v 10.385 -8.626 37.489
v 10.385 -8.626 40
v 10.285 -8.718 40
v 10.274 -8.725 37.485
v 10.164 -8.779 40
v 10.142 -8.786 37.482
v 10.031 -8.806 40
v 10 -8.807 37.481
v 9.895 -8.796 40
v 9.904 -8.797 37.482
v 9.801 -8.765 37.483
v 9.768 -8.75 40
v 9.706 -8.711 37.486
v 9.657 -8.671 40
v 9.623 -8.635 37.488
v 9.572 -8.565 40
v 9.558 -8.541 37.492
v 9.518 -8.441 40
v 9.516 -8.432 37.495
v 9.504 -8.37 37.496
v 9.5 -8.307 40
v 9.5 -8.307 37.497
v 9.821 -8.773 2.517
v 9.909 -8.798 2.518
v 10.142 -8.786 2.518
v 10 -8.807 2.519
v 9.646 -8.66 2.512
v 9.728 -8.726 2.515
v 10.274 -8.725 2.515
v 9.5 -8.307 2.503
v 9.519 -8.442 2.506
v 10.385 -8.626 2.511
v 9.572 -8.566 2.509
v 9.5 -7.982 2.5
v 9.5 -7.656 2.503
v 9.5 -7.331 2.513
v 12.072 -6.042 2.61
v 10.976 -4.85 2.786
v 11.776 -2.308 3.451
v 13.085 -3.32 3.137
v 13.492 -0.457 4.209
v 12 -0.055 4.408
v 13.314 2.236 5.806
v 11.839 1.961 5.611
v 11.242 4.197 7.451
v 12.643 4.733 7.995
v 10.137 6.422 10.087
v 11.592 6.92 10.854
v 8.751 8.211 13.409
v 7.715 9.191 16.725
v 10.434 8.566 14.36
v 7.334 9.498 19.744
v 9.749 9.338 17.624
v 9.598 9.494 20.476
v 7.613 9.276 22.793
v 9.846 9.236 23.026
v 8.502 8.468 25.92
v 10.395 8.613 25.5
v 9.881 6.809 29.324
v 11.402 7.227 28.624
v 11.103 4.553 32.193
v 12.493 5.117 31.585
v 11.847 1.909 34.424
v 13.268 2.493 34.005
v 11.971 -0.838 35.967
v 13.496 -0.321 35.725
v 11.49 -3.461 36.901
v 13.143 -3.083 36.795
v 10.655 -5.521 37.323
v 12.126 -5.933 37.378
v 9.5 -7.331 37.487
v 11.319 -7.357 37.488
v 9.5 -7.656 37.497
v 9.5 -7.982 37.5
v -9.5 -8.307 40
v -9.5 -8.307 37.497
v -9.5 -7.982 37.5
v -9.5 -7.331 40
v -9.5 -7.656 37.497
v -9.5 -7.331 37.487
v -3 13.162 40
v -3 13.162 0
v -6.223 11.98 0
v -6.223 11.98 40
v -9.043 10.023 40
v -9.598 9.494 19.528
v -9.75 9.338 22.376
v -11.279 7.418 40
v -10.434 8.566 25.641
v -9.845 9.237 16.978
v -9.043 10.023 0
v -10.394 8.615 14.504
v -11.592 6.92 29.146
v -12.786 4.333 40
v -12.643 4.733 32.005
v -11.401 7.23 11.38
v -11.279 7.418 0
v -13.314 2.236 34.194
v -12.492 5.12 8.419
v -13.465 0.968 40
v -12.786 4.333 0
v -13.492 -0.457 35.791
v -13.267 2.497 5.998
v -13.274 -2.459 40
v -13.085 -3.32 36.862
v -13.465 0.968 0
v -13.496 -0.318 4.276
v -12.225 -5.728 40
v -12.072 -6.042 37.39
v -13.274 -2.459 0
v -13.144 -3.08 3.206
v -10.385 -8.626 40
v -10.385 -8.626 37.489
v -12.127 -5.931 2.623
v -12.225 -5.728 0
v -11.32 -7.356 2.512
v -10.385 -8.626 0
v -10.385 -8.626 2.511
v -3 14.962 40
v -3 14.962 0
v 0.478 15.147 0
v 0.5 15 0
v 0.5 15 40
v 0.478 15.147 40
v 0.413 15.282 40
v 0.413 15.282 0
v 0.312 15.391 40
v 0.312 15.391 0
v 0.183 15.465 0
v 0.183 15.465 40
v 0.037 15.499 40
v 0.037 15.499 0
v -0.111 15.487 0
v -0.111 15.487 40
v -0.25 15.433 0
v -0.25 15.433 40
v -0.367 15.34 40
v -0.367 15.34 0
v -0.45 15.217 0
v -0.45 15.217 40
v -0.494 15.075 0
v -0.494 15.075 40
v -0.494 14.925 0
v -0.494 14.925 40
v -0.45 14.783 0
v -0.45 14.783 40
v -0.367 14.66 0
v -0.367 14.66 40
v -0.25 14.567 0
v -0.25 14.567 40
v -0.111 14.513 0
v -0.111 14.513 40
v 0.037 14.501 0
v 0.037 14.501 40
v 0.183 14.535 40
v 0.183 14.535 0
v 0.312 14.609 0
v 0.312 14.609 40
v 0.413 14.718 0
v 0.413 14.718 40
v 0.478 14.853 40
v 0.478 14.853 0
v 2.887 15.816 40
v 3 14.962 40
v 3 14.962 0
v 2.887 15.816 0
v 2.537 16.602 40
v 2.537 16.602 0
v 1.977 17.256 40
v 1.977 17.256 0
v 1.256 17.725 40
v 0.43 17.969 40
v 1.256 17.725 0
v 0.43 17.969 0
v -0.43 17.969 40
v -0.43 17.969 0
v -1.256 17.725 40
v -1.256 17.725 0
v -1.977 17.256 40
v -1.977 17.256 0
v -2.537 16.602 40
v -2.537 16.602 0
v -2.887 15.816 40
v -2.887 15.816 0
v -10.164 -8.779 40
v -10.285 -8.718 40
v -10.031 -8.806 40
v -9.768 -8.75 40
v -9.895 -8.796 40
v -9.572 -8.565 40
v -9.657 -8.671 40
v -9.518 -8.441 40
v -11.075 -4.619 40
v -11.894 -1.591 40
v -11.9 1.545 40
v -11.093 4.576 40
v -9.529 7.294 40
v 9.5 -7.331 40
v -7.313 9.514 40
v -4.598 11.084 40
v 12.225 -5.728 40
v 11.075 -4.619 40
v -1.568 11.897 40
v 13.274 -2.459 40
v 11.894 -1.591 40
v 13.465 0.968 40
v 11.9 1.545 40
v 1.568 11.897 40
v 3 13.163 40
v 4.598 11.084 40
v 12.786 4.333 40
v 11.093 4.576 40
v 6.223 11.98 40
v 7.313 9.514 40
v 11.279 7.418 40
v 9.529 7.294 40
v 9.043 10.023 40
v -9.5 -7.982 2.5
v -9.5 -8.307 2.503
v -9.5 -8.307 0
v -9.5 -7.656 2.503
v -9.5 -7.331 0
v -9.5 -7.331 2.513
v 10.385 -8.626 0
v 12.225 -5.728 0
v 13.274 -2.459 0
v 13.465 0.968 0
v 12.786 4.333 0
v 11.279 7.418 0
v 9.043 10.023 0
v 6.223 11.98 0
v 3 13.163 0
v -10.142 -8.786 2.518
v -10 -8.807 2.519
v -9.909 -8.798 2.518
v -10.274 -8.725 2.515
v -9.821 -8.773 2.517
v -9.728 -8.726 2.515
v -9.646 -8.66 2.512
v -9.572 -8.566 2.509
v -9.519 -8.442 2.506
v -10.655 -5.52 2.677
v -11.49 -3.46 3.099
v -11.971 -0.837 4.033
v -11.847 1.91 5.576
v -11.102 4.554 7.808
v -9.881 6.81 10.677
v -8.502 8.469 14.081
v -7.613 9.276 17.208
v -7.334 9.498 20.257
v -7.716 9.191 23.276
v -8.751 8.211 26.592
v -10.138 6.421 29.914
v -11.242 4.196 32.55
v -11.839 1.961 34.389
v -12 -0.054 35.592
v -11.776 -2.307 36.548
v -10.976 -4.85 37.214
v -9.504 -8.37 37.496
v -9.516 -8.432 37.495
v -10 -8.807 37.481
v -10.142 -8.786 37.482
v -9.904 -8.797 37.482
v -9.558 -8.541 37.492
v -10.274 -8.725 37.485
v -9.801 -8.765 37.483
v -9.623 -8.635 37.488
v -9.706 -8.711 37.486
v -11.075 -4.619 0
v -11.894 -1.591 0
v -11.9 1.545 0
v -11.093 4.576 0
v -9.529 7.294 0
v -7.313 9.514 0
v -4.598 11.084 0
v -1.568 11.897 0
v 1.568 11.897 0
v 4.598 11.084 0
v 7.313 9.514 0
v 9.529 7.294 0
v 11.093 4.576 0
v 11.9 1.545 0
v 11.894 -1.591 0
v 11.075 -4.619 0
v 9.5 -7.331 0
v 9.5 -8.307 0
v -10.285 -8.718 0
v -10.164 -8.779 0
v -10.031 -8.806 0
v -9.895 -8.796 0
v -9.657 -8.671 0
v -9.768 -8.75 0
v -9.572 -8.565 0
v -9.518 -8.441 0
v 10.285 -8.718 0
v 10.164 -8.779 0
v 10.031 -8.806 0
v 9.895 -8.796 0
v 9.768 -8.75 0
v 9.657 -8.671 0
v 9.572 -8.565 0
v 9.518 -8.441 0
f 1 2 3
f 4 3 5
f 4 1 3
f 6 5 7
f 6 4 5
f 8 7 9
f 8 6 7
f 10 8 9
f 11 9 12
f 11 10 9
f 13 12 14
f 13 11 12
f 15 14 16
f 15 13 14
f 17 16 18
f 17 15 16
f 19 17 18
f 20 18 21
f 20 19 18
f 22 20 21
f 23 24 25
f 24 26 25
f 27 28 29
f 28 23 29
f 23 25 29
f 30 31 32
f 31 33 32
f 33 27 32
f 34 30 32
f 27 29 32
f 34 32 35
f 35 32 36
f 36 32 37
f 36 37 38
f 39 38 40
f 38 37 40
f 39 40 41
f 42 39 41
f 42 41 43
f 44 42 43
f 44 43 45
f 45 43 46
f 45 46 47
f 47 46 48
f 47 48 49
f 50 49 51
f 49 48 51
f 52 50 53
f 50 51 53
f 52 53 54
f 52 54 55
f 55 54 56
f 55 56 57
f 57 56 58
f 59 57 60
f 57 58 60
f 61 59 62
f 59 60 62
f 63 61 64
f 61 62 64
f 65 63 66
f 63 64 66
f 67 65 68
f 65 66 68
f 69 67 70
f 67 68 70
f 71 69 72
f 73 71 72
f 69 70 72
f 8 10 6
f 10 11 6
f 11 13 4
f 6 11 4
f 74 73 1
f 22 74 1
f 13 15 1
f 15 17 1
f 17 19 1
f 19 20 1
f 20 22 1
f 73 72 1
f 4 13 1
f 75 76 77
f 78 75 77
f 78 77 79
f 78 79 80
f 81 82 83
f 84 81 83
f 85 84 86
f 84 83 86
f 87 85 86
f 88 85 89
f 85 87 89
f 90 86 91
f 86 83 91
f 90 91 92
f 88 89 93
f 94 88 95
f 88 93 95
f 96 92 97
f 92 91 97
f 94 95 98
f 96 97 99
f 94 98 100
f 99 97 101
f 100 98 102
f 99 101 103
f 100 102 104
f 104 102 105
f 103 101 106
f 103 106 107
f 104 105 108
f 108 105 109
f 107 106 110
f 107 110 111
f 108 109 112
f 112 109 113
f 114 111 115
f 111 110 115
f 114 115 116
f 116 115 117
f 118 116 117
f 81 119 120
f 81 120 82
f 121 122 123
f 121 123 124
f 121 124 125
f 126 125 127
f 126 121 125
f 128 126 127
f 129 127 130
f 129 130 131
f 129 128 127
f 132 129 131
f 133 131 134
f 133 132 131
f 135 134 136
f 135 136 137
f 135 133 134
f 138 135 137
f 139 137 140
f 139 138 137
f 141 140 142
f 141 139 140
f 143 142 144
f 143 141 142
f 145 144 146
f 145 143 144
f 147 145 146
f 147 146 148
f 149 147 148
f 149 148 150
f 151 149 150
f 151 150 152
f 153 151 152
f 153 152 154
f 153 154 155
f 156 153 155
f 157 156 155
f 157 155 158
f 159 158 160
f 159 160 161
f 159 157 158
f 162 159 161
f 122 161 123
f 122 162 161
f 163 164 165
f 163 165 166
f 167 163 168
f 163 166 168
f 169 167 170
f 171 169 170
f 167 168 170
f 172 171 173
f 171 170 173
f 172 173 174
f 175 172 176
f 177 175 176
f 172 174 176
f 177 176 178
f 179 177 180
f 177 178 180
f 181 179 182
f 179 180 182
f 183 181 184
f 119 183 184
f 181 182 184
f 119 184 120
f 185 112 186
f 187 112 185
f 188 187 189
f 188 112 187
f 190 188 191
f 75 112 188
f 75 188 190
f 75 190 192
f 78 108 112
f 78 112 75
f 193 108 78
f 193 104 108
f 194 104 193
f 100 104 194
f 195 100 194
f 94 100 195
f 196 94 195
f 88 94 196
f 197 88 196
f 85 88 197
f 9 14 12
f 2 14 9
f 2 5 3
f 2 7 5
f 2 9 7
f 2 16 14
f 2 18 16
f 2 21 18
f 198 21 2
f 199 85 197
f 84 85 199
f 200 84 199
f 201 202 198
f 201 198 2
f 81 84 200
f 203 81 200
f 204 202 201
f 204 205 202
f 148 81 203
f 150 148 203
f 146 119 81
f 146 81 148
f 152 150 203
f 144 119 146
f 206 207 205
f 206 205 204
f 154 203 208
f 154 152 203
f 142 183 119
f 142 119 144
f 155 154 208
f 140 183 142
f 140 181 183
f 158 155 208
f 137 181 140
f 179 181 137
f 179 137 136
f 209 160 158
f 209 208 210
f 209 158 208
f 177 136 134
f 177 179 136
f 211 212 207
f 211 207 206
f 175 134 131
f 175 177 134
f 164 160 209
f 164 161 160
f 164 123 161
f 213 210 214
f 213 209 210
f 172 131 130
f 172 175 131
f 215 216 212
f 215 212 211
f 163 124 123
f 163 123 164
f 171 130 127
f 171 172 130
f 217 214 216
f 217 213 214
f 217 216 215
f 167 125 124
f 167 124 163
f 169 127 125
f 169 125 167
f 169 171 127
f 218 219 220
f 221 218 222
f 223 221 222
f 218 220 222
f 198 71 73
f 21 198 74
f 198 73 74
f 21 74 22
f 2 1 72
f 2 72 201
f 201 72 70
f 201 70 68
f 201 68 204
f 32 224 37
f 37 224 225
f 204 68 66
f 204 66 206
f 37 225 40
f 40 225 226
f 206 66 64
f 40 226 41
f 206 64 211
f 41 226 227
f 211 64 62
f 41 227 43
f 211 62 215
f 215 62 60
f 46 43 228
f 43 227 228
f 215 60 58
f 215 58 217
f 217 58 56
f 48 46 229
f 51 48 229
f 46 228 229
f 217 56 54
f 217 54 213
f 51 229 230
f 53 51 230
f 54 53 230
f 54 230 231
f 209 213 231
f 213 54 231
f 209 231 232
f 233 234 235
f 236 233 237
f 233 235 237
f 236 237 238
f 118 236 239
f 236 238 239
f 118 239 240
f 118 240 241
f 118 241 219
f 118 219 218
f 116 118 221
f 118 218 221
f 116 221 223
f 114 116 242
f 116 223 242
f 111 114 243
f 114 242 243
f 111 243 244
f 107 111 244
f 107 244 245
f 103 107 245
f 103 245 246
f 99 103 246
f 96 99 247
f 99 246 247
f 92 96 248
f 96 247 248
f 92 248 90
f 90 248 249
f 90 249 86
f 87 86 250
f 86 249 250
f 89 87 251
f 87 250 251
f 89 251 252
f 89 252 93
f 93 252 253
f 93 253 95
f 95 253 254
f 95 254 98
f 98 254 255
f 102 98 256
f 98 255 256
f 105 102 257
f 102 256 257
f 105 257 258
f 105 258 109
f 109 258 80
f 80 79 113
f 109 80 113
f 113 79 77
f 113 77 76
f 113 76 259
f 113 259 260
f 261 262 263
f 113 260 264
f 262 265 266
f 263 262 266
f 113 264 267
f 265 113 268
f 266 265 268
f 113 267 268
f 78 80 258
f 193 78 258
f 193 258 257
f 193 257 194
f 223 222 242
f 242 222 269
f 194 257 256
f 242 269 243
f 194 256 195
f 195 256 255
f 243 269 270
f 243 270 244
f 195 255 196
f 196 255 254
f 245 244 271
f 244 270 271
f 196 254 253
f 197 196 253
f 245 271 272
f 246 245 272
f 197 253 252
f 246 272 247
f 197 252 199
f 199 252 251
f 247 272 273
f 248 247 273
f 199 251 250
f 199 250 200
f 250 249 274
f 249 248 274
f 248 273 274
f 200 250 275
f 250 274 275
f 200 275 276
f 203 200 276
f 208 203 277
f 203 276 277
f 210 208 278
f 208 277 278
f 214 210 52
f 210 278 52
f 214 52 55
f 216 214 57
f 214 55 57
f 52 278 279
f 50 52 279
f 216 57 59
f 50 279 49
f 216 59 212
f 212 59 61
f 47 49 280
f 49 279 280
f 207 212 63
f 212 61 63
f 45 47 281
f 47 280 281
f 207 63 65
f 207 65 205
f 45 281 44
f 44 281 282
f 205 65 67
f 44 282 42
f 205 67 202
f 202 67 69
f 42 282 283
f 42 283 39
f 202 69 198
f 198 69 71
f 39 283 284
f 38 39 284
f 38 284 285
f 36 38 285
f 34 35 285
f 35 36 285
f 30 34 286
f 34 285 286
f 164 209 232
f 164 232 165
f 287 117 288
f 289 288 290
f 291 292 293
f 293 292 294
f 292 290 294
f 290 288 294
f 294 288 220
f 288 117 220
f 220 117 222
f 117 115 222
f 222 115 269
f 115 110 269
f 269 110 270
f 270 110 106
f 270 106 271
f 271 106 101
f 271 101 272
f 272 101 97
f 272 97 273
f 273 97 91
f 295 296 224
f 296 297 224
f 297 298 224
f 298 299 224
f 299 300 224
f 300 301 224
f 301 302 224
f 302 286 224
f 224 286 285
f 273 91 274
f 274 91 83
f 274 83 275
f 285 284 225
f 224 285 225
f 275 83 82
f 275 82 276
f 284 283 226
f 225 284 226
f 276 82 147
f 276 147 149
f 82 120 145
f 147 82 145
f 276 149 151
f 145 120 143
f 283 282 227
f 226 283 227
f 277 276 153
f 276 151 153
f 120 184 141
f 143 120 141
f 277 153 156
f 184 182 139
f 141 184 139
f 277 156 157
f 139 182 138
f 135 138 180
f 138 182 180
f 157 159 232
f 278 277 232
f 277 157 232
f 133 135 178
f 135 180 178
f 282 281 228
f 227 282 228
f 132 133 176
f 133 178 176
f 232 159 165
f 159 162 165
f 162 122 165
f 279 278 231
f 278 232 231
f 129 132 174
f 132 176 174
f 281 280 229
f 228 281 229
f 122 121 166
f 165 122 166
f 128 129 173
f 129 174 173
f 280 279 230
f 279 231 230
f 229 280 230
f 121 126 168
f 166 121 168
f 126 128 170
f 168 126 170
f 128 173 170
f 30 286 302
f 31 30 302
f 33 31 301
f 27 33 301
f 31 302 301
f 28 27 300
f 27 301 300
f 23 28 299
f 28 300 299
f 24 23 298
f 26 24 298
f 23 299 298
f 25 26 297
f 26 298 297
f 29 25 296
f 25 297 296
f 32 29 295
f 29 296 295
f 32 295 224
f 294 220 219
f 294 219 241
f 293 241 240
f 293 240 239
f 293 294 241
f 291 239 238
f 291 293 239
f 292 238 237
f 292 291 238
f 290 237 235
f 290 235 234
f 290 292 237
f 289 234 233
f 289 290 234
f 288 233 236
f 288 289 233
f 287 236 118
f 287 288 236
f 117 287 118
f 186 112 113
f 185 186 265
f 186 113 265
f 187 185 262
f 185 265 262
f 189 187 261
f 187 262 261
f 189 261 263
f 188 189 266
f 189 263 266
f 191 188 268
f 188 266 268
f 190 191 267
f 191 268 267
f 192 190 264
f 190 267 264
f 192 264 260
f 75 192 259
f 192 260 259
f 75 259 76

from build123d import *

# Parameters (mm, degrees)
F1_DEPTH    = 40
F2_R        = 17.5
F3_DEPTH    = 15
F5_R        = 0.5
F6_DEPTH    = 40
F7_T1_DEPTH = 9.1201245228
F7_T3_DEPTH = 9.1201245228


# Not quite as in the source:
# - a fillet or chamfer that OpenCascade refuses, or shapes differently, is made with other operations: its cross-section is extruded or revolved along the edge and cut away or added


with BuildPart() as f1:
    # F0 (on Top) → F1 (new body)
    with BuildSketch(Plane.XY):
        with BuildLine():
            ThreePointArc((-9.5, -7.3314391493), (0, 12), (9.5, -7.3314391493))
            Line((9.5, -7.3314391493), (9.5, -9.5916630466))
            ThreePointArc((9.5, -9.5916630466), (0, 13.5), (-9.5, -9.5916630466))
            Line((-9.5, -9.5916630466), (-9.5, -7.3314391493))
        make_face()
    extrude(amount=F1_DEPTH)


with BuildPart() as f3:
    # F2 (on Right) → F3 (new body, symmetric)
    with BuildSketch(Plane.YZ):
        with Locations((-8, 20)):
            Circle(F2_R)
    extrude(amount=F3_DEPTH, both=True)


with BuildPart() as f1_1:
    add(f1.part)

    # F4: cut F3
    add(f3.part, mode=Mode.SUBTRACT)

    # F5 (on Top) → F6 (join)
    with BuildSketch(Plane.XY):
        with BuildLine():
            Line((2.9997656158, 13.1625), (2.9997656158, 14.9625))
            ThreePointArc((2.9997656158, 14.9625), (0, 18), (-2.9997656158, 14.9625))
            Line((-2.9997656158, 14.9625), (-2.9997656158, 13.1625))
            ThreePointArc((-2.9997656158, 13.1625), (0, 13.5), (2.9997656158, 13.1625))
        make_face()
        with Locations((0, 15)):
            Circle(F5_R, mode=Mode.SUBTRACT)
    extrude(amount=F6_DEPTH)

    # F7: fillet of radius 0.5 on 4 edges, made by hand

    # F7_s2 → F7_t1 (cut)
    with BuildSketch(Plane.XY.offset(34.1536712775)):
        with BuildLine():
            ThreePointArc((-10.3846153846, -8.6261093961), (-9.8301584449, -8.7768938345), (-9.5, -8.3066238629))
            Line((-9.5, -8.3066238629), (-9.5, -9.5916630466))
            ThreePointArc((-9.5, -9.5916630466), (-9.9540220872, -9.1196186482), (-10.3846153846, -8.6261093961))
        make_face()
        with BuildLine():
            ThreePointArc((10.3846153846, -8.6261093961), (9.8301584449, -8.7768938345), (9.5, -8.3066238629))
            Line((9.5, -8.3066238629), (9.5, -9.5916630466))
            ThreePointArc((9.5, -9.5916630466), (9.9540220872, -9.1196186482), (10.3846153846, -8.6261093961))
        make_face()
    extrude(amount=F7_T1_DEPTH, mode=Mode.SUBTRACT)

    # F7_s4 → F7_t3 (cut)
    with BuildSketch(Plane.XY.offset(-3.2737958003)):
        with BuildLine():
            ThreePointArc((9.5, -8.3066238629), (9.8301584449, -8.7768938345), (10.3846153846, -8.6261093961))
            ThreePointArc((10.3846153846, -8.6261093961), (9.9540220872, -9.1196186482), (9.5, -9.5916630466))
            Line((9.5, -9.5916630466), (9.5, -8.3066238629))
        make_face()
        with BuildLine():
            ThreePointArc((-9.5, -8.3066238629), (-9.8301584449, -8.7768938345), (-10.3846153846, -8.6261093961))
            ThreePointArc((-10.3846153846, -8.6261093961), (-9.9540220872, -9.1196186482), (-9.5, -9.5916630466))
            Line((-9.5, -9.5916630466), (-9.5, -8.3066238629))
        make_face()
    extrude(amount=F7_T3_DEPTH, mode=Mode.SUBTRACT)


solid = f1_1.part
